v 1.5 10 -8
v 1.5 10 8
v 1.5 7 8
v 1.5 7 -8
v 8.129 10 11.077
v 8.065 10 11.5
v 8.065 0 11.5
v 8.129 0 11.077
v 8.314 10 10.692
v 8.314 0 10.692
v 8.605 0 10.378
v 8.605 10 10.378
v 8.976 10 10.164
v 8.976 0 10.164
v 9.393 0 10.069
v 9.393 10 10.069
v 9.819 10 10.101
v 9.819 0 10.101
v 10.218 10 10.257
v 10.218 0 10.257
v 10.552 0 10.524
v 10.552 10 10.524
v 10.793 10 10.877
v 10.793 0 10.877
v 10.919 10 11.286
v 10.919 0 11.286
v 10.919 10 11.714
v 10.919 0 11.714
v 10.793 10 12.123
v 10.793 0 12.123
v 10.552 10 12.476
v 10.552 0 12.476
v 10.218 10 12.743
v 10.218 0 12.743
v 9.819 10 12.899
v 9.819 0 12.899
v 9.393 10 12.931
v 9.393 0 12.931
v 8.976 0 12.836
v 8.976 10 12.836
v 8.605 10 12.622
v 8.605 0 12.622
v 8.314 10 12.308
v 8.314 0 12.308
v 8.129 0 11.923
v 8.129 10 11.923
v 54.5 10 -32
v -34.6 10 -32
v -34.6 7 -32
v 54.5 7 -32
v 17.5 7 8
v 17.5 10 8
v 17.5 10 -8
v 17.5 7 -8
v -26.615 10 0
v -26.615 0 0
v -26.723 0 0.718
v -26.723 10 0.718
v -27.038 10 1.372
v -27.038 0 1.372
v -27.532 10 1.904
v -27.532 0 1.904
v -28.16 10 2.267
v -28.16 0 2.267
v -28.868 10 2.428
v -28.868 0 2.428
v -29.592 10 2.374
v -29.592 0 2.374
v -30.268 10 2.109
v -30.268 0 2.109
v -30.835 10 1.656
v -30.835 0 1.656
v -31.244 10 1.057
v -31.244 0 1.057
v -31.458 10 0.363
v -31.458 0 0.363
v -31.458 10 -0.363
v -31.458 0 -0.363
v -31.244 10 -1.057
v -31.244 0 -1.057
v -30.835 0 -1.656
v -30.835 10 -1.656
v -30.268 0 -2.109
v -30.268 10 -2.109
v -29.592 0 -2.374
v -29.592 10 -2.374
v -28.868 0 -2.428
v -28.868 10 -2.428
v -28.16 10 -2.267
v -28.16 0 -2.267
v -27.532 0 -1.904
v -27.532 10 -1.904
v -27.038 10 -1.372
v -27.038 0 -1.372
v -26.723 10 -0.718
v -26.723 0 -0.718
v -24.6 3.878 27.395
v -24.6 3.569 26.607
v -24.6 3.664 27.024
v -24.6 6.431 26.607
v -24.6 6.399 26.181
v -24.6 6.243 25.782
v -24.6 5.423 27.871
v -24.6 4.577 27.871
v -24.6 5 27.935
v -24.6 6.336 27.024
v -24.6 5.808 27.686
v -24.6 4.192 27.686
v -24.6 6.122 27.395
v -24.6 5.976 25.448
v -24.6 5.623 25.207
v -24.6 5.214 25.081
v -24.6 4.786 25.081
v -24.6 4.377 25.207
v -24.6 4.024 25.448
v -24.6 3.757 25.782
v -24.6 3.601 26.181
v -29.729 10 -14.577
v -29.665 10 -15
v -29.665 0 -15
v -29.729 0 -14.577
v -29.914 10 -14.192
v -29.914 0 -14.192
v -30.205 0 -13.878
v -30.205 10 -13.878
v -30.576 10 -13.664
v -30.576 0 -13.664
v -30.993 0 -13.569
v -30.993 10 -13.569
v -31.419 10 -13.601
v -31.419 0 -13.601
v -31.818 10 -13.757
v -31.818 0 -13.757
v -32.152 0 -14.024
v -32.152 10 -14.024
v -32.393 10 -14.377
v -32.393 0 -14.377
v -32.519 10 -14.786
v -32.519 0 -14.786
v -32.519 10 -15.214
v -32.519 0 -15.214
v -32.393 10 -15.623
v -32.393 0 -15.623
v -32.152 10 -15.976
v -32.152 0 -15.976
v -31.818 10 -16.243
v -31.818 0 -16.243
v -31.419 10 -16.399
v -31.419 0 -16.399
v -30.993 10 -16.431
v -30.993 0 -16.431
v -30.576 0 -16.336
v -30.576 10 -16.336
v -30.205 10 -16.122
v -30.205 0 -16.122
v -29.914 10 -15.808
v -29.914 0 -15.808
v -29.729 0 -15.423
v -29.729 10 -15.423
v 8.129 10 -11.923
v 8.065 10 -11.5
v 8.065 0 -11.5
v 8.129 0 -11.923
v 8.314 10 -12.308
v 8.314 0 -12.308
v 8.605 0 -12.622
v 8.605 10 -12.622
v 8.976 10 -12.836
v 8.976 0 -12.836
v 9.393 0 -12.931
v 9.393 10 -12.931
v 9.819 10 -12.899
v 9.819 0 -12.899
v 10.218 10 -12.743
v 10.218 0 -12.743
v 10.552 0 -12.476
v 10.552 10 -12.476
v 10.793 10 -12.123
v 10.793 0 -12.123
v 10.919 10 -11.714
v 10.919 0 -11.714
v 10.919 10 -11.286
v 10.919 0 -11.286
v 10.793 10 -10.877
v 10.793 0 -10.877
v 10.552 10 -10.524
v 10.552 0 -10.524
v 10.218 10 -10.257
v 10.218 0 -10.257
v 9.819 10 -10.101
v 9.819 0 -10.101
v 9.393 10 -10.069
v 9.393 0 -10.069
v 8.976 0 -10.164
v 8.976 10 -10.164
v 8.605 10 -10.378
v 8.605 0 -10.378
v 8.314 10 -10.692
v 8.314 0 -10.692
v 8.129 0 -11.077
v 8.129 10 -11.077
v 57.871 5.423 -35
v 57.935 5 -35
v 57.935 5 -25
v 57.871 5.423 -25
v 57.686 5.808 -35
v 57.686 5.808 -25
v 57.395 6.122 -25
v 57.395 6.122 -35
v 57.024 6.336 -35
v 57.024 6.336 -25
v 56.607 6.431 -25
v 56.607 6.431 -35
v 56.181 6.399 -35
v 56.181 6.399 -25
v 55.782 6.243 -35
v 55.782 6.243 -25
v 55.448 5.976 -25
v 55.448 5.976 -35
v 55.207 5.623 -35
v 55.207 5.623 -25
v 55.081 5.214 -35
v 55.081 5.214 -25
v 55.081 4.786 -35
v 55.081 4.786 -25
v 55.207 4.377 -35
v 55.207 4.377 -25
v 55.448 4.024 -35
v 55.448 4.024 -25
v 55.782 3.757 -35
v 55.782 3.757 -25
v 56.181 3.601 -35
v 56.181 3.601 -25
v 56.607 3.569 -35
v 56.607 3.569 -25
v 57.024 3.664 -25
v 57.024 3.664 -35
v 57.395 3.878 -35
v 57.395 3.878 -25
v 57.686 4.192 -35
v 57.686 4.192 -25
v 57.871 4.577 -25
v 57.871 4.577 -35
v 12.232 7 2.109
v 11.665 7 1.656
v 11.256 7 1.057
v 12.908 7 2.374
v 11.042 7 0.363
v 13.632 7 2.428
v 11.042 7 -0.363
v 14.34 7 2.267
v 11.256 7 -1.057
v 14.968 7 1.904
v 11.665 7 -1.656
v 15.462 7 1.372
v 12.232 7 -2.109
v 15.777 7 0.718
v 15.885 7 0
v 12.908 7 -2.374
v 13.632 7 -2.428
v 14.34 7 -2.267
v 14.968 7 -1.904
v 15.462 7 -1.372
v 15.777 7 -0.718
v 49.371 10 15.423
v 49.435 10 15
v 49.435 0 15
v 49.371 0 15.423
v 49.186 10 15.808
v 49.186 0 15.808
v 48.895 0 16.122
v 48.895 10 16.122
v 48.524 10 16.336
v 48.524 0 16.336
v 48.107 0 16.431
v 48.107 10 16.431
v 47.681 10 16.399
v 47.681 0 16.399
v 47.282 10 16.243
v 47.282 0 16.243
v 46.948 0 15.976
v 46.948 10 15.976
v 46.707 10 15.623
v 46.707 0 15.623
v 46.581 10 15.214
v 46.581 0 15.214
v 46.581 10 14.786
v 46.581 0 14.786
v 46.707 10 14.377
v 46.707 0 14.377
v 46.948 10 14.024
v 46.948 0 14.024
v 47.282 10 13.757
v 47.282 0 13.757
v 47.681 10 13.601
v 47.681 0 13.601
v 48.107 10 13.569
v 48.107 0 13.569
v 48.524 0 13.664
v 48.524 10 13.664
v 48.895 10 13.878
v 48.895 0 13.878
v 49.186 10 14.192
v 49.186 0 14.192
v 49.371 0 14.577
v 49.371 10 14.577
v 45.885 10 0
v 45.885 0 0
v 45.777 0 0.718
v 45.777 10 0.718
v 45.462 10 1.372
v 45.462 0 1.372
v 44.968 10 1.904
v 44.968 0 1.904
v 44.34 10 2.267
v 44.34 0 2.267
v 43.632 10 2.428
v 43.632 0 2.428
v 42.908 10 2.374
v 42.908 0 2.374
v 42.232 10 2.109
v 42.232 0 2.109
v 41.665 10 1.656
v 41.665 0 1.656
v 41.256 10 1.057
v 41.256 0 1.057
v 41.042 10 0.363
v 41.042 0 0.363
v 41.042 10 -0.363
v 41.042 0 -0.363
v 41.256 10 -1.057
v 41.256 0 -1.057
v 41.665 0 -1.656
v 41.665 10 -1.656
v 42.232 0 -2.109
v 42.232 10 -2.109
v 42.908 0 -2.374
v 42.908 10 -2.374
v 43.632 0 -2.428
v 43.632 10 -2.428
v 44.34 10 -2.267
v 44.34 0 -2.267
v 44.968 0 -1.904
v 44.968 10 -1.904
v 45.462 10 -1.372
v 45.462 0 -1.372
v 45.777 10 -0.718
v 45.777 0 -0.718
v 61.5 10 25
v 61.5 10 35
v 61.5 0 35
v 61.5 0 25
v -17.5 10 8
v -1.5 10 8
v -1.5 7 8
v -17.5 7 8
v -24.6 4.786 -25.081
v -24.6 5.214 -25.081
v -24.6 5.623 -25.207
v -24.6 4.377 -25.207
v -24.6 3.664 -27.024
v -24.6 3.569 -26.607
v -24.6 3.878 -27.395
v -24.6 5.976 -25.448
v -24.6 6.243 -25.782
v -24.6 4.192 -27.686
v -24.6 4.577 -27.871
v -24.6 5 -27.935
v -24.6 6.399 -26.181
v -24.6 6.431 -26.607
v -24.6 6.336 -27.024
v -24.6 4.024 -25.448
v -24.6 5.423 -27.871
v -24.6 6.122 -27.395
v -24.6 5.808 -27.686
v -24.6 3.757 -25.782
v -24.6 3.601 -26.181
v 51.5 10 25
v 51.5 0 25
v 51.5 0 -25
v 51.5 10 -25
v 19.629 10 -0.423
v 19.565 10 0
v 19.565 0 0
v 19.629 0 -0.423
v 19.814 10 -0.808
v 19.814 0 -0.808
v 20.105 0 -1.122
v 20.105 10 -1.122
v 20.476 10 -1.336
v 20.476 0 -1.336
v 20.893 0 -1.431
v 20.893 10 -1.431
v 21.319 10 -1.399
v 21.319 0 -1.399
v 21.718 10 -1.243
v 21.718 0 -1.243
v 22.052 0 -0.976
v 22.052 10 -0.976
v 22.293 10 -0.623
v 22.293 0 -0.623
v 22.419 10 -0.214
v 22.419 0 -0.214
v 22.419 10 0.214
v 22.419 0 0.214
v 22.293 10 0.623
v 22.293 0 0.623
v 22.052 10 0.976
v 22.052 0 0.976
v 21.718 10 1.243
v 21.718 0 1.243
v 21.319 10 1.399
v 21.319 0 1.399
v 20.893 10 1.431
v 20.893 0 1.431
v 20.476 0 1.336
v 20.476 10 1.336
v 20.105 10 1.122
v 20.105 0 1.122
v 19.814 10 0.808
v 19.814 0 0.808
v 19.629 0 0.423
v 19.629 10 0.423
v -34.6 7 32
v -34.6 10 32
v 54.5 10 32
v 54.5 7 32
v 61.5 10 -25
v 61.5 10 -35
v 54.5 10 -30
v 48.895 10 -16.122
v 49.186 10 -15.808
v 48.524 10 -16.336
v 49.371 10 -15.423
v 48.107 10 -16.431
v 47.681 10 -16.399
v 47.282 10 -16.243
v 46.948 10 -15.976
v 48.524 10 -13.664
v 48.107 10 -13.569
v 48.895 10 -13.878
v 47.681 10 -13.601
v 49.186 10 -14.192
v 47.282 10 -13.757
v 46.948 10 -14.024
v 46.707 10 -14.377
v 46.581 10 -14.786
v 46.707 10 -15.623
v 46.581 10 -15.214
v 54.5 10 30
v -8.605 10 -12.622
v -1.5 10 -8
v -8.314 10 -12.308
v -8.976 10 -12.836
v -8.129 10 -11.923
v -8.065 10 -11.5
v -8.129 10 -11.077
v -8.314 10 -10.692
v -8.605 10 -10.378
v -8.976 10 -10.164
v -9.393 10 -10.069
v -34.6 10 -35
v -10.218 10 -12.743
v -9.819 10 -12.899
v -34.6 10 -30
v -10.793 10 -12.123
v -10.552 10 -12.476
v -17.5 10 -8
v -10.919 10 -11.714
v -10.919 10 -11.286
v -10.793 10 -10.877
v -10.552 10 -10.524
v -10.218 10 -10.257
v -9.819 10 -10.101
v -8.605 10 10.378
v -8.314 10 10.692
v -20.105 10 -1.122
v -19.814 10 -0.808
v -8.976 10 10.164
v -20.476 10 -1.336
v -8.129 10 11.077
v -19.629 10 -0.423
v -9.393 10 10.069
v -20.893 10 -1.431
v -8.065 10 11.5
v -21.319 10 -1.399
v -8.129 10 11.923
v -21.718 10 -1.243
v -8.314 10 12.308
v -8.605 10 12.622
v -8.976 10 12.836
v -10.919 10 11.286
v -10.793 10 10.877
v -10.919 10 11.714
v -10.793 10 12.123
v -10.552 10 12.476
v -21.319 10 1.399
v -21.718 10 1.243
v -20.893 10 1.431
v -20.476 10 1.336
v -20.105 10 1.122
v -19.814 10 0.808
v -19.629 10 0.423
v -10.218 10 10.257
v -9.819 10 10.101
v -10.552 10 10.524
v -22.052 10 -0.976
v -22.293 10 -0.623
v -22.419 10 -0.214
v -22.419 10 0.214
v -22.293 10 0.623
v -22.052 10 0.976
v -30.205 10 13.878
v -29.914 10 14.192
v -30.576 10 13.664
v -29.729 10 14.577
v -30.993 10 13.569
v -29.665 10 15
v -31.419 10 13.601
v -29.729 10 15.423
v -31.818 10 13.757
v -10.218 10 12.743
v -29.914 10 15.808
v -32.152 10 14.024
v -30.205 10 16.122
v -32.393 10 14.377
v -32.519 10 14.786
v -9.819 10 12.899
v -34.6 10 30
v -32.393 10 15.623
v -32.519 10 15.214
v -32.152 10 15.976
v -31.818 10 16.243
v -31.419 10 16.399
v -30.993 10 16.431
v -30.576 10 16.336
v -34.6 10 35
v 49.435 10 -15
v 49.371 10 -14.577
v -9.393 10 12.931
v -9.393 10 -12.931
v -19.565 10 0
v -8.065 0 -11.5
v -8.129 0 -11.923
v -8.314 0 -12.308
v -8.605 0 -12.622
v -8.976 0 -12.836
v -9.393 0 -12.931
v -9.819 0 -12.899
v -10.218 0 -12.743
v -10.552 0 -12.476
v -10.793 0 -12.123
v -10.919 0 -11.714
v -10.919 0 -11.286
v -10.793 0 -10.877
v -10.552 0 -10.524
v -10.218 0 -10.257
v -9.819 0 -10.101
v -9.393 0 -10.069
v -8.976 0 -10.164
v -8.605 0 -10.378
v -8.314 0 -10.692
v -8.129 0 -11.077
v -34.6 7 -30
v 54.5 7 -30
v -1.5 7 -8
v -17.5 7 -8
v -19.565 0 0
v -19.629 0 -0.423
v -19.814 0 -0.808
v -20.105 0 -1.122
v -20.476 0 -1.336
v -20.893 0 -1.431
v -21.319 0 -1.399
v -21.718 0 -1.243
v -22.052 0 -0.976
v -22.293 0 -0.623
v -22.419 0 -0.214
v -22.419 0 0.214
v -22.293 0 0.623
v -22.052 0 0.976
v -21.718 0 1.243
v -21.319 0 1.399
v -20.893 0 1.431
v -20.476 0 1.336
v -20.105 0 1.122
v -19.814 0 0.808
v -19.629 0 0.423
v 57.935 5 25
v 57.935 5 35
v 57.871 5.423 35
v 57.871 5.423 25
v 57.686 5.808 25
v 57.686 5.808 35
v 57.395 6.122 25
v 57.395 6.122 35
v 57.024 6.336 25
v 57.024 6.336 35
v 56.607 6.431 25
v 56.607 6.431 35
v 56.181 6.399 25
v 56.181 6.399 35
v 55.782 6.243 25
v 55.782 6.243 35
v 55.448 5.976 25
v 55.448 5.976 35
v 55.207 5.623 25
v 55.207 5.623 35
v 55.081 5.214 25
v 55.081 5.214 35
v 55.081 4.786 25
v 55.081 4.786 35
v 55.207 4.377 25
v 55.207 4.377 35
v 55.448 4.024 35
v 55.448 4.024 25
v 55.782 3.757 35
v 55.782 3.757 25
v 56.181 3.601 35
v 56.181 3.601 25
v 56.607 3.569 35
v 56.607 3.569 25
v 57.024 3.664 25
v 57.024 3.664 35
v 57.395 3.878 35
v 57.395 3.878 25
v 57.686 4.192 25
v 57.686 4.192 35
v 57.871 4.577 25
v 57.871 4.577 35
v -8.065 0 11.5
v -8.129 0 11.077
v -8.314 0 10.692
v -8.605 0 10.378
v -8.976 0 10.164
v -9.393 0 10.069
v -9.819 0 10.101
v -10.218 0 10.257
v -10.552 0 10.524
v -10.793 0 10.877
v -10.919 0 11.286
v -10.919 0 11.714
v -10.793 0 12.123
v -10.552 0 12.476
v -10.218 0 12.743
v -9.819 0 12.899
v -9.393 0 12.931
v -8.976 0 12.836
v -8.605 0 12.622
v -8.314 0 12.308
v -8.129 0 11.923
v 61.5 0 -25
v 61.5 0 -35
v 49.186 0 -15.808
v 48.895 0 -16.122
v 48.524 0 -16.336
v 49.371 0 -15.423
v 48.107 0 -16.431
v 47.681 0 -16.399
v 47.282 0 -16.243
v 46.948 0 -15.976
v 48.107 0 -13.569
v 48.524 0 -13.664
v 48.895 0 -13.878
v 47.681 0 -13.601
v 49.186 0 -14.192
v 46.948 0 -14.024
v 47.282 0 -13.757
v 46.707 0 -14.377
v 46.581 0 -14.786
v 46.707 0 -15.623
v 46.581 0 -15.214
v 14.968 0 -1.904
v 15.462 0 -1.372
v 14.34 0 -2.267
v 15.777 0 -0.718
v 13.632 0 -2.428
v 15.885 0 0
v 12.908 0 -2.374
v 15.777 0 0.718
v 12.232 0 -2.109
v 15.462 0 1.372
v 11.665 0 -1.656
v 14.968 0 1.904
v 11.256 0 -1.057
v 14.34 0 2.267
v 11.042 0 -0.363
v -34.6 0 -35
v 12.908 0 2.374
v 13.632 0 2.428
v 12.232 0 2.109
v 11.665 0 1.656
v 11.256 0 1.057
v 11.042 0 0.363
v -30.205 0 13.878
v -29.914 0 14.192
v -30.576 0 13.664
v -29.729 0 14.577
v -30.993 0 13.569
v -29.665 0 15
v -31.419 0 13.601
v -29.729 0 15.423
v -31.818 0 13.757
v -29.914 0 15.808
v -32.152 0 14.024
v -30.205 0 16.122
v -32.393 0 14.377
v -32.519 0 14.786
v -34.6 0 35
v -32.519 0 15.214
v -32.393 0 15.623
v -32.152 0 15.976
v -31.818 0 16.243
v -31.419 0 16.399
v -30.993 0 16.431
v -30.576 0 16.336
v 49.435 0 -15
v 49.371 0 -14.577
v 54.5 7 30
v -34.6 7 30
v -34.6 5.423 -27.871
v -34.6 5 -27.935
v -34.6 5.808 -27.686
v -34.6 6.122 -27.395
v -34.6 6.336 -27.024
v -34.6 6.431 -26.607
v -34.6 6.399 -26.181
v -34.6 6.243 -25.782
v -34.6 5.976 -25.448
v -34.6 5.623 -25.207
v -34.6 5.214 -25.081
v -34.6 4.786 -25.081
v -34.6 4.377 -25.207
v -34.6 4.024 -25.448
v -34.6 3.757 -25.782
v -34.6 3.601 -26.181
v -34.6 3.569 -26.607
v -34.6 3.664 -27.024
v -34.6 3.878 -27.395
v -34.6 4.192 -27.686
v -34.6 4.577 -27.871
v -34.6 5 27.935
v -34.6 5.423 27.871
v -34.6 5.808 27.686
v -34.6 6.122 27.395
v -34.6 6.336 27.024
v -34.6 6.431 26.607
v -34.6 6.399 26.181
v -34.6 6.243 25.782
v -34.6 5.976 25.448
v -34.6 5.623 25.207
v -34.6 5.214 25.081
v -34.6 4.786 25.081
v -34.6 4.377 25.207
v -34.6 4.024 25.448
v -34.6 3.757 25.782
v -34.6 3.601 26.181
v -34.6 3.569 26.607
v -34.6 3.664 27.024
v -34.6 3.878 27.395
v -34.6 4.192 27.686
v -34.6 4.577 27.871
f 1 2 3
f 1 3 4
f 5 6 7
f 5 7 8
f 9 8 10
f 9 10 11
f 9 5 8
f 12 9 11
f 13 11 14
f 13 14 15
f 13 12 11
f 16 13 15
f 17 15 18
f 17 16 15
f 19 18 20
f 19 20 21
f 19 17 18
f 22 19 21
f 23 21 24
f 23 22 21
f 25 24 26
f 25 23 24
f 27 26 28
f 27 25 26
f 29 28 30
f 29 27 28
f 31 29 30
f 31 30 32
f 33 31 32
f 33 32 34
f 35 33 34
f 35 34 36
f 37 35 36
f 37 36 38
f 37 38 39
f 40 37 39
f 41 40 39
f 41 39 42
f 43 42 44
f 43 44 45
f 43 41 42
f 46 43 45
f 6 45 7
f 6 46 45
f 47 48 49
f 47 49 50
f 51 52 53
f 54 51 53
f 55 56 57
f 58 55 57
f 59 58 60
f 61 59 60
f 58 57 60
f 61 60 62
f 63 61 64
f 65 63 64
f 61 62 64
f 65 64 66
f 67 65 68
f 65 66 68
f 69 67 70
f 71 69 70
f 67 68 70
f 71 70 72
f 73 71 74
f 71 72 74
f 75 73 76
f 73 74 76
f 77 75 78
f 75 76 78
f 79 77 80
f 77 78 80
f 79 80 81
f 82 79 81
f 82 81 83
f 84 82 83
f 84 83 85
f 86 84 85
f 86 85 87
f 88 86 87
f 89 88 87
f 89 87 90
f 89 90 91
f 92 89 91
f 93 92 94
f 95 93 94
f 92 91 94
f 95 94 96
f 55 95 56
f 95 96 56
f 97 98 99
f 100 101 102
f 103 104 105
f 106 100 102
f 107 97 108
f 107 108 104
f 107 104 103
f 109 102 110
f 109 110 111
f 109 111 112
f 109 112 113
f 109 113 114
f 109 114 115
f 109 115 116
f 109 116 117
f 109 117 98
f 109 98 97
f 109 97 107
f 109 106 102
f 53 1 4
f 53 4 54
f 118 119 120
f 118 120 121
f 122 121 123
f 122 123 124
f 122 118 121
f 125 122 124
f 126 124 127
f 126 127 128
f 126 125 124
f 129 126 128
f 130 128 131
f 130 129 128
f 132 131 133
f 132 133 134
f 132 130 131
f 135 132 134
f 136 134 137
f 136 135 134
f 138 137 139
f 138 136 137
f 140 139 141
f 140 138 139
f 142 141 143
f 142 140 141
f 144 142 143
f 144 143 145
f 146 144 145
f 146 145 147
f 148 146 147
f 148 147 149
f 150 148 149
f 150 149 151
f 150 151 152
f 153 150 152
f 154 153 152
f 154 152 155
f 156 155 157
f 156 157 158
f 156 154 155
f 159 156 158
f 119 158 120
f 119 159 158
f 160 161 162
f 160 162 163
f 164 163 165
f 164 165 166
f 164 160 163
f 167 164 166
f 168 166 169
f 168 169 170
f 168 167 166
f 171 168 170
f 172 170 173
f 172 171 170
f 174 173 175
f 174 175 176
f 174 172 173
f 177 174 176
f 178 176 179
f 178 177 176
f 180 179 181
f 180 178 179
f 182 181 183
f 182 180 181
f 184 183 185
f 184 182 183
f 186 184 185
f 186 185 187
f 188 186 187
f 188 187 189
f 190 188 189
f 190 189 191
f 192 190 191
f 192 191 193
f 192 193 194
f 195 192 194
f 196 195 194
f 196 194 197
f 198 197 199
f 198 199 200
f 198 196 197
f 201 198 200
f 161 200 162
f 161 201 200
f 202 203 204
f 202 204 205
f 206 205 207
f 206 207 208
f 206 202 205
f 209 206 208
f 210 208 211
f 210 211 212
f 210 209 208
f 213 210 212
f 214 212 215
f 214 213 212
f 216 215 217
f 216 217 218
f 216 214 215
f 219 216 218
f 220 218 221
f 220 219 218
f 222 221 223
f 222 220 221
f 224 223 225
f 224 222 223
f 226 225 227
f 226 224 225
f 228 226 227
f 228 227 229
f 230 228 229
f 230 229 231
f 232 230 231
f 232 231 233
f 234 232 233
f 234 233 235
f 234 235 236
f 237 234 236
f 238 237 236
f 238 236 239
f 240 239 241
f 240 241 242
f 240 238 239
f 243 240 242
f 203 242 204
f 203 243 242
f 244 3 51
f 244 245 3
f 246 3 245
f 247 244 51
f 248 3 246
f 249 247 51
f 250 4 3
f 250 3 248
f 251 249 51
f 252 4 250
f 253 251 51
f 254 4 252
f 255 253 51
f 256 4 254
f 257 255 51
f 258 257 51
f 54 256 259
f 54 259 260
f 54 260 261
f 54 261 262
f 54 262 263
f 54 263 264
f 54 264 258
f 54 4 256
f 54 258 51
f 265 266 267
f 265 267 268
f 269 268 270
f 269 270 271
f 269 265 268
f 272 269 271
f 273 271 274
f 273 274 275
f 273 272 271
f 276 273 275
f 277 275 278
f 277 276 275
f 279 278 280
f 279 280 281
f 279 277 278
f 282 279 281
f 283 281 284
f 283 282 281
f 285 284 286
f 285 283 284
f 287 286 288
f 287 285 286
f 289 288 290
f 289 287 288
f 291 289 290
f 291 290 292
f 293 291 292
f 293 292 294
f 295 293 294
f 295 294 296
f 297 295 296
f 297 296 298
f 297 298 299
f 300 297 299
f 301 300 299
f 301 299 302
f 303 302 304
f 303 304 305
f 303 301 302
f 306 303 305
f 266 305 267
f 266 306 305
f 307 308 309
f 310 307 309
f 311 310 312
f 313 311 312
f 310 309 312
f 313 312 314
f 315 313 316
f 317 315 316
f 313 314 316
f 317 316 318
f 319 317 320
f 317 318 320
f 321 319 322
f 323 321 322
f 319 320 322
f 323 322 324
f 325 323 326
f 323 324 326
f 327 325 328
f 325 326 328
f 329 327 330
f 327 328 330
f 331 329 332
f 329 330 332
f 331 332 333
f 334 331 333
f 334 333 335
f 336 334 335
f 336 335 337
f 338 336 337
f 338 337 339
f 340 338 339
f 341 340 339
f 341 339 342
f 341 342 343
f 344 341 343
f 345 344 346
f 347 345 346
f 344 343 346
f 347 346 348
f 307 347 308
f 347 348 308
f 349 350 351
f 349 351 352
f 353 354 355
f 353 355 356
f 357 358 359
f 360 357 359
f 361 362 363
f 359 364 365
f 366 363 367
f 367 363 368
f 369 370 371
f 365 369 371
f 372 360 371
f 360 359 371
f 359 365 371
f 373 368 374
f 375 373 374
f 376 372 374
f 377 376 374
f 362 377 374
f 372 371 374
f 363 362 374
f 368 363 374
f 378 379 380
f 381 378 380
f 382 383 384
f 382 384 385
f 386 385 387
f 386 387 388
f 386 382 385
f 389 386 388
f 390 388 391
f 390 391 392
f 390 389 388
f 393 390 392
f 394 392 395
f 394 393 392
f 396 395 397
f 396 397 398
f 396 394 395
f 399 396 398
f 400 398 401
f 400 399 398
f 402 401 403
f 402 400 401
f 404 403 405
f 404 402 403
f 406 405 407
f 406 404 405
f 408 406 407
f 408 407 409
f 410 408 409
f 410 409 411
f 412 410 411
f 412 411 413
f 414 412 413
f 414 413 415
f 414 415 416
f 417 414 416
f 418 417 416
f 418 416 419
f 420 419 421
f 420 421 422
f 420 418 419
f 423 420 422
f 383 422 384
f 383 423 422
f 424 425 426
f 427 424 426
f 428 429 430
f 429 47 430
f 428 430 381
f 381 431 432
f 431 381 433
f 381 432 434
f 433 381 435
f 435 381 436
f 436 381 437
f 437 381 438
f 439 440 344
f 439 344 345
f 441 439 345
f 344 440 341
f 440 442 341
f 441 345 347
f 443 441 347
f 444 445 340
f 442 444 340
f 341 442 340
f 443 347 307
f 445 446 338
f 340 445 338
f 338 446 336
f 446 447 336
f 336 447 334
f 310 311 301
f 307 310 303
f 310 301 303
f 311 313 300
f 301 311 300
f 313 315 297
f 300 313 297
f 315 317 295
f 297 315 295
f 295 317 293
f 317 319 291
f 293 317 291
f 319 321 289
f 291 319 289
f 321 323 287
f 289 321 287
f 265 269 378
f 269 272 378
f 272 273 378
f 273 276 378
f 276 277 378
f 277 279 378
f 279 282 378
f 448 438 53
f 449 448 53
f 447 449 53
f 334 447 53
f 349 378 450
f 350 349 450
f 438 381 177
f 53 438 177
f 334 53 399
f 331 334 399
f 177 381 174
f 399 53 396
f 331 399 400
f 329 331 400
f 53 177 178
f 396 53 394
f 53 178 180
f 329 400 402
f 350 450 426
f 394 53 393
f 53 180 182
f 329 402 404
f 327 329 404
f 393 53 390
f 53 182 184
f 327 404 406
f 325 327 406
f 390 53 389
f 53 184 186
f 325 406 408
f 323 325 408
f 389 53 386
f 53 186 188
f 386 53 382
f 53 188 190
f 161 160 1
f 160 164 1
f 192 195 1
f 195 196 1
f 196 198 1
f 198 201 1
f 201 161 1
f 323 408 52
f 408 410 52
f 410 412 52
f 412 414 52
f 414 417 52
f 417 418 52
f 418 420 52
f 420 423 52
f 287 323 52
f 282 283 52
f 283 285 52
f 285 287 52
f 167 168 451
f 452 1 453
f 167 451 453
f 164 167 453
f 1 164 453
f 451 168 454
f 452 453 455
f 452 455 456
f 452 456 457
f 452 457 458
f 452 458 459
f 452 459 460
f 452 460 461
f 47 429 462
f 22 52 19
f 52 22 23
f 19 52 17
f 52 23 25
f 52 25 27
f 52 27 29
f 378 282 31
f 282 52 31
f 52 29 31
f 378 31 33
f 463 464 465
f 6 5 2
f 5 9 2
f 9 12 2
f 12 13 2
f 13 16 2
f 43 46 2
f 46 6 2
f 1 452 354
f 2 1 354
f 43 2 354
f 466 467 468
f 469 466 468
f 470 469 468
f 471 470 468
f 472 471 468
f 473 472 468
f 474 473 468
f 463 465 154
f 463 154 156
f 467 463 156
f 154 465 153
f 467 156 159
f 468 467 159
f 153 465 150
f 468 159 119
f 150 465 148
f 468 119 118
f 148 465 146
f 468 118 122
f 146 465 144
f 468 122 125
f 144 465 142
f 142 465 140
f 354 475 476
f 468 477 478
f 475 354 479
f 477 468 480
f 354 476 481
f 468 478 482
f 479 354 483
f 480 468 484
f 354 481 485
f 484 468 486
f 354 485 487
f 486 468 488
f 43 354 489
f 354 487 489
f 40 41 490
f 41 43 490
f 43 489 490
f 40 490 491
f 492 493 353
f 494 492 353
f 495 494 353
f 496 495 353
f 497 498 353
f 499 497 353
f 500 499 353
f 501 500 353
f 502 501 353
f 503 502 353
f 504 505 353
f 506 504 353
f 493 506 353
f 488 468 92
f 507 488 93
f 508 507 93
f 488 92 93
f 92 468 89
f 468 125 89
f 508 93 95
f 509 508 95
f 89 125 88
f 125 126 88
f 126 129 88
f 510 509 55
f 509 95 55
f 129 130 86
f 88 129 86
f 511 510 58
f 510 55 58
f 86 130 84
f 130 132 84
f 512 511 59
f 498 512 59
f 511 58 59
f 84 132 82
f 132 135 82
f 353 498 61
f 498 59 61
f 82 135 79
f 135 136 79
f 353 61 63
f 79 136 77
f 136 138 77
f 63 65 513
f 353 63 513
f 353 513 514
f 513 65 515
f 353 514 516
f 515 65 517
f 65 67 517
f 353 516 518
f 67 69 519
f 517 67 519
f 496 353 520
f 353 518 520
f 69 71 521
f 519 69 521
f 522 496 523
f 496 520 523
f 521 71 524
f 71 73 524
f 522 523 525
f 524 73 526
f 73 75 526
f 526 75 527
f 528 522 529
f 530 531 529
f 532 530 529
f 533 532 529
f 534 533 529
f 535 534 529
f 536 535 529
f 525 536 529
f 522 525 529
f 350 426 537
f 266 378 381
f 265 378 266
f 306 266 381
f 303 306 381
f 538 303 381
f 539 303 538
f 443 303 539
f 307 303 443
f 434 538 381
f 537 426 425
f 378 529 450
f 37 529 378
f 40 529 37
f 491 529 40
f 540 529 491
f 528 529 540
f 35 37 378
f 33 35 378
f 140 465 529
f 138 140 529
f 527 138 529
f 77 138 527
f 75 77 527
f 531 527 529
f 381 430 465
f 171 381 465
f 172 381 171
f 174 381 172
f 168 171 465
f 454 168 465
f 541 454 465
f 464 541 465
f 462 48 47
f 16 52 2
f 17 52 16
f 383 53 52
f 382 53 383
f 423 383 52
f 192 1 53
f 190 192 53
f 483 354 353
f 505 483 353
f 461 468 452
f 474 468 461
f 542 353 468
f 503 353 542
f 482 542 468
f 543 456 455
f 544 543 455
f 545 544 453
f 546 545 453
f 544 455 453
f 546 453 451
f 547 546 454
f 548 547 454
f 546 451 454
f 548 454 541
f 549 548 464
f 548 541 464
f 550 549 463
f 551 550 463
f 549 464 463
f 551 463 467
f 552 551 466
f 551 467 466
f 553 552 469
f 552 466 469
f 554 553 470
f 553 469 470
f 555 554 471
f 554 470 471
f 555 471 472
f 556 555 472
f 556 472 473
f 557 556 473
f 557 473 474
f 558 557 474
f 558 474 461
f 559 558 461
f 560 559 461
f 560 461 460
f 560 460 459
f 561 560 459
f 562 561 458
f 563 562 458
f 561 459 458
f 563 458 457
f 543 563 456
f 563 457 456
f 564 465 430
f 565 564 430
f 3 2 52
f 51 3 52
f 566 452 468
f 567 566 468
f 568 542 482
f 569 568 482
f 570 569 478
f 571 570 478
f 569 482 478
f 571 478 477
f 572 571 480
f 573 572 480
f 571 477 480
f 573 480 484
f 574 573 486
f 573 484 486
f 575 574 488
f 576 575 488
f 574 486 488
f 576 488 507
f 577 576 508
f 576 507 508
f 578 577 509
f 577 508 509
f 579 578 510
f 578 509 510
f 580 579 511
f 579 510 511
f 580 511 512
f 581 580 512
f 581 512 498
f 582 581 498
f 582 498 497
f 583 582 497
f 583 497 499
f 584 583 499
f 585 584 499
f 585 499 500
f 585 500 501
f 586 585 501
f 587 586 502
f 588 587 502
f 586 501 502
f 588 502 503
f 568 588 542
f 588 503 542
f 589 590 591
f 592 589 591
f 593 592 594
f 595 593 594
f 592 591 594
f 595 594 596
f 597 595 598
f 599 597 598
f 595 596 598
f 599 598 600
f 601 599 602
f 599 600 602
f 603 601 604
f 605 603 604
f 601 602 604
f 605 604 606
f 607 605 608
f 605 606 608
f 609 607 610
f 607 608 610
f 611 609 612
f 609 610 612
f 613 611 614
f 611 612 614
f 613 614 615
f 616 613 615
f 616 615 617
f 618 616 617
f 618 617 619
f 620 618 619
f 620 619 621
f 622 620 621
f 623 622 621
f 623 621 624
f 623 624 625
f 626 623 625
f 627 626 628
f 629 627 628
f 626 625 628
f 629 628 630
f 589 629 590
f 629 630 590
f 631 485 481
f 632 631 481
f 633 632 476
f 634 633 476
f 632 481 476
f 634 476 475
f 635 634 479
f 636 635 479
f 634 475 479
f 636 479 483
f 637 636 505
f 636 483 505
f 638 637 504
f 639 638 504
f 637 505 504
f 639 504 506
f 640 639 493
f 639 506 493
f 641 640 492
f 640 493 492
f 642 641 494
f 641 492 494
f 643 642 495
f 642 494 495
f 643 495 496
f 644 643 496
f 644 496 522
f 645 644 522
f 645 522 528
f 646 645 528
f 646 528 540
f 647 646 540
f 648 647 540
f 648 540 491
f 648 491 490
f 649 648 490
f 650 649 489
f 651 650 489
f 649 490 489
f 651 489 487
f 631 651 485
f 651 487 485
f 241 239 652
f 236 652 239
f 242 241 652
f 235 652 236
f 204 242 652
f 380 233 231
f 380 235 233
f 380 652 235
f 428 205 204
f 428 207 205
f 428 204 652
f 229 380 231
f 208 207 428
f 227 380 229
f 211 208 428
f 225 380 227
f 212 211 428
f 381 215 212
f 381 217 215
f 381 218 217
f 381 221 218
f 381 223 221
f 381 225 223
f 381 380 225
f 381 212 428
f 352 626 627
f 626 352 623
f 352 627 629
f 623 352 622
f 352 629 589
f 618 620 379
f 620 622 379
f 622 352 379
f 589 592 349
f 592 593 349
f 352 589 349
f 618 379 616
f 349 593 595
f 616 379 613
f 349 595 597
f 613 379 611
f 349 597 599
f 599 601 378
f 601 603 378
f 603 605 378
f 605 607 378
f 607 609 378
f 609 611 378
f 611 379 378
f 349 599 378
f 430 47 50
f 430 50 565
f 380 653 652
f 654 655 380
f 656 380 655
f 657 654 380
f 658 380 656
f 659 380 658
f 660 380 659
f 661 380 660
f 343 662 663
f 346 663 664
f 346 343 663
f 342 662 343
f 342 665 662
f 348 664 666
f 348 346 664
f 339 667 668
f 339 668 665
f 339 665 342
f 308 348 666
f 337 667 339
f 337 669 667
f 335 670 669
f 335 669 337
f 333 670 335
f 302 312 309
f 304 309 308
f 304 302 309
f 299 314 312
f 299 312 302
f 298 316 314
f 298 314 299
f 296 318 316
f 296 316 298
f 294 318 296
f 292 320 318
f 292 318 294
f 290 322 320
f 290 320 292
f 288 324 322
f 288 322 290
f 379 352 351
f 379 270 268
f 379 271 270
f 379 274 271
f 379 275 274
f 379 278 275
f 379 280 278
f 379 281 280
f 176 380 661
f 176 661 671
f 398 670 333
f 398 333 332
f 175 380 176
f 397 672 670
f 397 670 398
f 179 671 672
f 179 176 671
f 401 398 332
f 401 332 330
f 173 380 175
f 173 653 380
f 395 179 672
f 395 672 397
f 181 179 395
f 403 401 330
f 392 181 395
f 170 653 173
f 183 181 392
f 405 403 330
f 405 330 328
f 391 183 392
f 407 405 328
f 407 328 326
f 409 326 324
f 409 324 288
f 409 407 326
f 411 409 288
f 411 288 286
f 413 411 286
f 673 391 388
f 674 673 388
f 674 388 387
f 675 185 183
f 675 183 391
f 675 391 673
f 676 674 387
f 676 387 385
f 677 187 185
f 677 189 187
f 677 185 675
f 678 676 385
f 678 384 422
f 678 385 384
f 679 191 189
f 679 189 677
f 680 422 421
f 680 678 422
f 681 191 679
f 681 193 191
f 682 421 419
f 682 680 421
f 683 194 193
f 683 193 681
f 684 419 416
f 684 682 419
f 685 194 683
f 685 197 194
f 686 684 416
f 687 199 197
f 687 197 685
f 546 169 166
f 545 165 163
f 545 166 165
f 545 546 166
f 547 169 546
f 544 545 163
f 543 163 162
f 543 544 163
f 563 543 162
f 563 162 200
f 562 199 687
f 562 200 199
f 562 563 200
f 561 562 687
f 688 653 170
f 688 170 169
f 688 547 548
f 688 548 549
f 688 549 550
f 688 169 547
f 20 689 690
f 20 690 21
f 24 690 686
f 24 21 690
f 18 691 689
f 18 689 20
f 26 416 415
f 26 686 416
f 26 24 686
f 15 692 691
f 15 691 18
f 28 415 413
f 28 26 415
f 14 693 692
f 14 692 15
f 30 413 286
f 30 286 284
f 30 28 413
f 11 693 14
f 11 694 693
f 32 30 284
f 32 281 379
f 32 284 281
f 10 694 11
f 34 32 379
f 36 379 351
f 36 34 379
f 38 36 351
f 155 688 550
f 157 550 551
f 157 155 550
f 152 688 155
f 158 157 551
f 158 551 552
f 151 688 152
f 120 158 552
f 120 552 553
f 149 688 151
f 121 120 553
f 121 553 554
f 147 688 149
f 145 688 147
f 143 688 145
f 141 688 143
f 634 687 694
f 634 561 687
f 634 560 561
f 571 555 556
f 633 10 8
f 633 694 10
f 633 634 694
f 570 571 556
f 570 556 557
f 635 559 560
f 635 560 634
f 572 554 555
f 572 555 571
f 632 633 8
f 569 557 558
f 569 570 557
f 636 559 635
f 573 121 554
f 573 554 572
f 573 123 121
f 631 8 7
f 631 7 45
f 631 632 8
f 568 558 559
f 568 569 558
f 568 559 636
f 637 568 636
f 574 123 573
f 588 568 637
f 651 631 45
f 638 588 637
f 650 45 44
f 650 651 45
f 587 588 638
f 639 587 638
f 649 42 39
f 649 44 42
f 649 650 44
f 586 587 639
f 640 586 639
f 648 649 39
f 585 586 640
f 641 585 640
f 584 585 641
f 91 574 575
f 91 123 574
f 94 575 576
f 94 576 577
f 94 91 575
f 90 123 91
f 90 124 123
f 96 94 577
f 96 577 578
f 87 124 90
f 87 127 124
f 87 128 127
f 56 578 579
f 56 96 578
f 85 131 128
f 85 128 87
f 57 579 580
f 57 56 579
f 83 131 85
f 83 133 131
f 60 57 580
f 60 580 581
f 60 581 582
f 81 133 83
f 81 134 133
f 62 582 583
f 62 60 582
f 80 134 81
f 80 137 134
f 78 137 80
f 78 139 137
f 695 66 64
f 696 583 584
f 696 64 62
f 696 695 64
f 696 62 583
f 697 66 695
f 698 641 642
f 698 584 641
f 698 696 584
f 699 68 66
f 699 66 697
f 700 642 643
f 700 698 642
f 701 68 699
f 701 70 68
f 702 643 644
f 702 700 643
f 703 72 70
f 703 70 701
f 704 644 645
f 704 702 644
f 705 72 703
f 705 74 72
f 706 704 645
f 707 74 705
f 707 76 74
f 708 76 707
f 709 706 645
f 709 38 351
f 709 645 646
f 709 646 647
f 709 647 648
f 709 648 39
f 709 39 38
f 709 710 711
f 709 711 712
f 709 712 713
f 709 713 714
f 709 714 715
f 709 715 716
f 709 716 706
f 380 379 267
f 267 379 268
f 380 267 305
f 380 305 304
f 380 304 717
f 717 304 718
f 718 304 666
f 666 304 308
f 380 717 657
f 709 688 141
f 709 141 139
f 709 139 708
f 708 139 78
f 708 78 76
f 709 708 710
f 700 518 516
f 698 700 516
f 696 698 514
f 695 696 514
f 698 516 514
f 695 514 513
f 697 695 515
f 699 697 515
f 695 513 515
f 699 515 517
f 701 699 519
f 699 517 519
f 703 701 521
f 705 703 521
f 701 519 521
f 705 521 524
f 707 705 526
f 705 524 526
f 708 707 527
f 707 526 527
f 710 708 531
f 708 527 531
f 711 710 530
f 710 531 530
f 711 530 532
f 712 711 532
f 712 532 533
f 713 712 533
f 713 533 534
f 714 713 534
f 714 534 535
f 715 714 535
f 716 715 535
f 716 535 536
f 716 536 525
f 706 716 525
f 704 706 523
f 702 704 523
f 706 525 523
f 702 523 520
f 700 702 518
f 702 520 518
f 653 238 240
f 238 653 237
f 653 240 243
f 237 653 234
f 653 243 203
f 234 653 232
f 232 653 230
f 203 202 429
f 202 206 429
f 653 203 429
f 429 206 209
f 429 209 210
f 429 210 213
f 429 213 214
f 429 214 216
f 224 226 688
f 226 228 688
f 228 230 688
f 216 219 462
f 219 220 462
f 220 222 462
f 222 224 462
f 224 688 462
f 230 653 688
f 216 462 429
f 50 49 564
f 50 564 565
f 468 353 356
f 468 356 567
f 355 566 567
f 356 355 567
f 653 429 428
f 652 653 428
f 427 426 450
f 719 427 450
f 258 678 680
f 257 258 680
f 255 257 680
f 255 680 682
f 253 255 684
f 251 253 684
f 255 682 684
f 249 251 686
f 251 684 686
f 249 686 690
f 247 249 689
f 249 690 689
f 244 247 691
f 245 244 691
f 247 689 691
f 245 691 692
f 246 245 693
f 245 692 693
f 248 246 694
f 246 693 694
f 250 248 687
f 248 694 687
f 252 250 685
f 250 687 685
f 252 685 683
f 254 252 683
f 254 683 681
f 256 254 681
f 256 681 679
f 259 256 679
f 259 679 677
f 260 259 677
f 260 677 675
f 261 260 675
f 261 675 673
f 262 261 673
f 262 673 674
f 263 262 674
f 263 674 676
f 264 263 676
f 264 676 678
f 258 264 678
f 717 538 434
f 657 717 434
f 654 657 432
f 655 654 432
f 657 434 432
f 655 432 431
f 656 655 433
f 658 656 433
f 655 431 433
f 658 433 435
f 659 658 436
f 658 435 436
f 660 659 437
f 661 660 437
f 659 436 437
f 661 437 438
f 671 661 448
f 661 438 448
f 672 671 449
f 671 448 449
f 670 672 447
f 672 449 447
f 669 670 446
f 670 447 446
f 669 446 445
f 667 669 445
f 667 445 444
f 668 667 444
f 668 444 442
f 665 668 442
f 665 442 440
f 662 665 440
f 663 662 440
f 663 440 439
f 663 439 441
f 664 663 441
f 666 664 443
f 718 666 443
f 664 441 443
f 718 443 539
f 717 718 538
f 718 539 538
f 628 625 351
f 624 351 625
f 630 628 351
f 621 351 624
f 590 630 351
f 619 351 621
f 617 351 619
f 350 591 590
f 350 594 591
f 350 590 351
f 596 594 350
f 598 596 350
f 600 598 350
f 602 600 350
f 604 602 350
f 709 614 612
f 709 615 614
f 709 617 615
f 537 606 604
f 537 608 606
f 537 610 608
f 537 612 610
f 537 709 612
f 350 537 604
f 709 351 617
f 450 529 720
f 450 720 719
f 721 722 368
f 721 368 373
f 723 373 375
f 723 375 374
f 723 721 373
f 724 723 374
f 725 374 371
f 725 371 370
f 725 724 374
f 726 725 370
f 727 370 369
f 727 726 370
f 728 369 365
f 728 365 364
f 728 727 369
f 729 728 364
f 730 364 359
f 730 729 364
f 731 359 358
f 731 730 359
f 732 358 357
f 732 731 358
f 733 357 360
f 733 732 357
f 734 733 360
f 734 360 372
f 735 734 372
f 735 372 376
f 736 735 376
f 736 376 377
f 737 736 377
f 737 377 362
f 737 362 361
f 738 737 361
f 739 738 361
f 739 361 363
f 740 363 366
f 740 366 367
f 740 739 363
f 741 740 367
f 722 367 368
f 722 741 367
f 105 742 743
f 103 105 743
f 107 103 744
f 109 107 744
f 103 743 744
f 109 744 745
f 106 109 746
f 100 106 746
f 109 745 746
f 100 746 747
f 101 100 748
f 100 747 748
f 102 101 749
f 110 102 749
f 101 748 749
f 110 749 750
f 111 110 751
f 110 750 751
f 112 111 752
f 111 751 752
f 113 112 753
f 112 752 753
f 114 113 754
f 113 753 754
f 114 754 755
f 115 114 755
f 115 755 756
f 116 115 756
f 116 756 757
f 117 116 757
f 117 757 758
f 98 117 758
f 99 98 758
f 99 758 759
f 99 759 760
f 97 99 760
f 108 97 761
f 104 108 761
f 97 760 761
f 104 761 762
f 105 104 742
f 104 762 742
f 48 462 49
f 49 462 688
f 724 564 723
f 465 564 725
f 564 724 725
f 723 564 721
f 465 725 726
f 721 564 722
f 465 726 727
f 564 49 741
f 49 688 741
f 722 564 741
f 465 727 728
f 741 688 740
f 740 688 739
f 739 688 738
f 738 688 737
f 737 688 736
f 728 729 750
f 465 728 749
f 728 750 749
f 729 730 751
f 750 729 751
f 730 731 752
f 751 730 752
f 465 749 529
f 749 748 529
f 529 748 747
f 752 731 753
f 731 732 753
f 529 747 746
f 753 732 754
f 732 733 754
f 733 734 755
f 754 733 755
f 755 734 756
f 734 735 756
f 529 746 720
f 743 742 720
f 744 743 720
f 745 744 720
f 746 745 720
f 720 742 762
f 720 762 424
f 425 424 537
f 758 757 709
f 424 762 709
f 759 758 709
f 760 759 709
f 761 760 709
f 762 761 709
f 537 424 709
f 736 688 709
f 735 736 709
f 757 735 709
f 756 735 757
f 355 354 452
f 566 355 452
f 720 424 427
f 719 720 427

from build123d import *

# Parameters (mm, degrees)
SALIENTE_EXTRUIR1_DEPTH = 10
CROQUIS7_W              = 86.1
CROQUIS7_H              = 2
CORTAR_EXTRUIR4_DEPTH   = 3
CROQUIS15_R             = 1.435
CORTAR_EXTRUIR10_DEPTH  = 10
CROQUIS16_W             = 10
CROQUIS16_H             = 10
SALIENTE_EXTRUIR7_DEPTH = 10
CROQUIS17_W             = 3
CROQUIS17_H             = 2
CORTAR_EXTRUIR11_DEPTH  = 3
CROQUIS18_R             = 1.435
CORTAR_EXTRUIR12_DEPTH  = 10
CROQUIS19_R             = 1.435
CORTAR_EXTRUIR13_DEPTH  = 10
CROQUIS20_R             = 1.435
CORTAR_EXTRUIR14_DEPTH  = 10
CROQUIS21_R             = 2.435
CORTAR_EXTRUIR15_DEPTH  = 10
CROQUIS2_W              = 16
CROQUIS2_H              = 16
CORTAR_EXTRUIR16_DEPTH  = 3
CROQUIS22_R             = 1.435
CORTAR_EXTRUIR17_DEPTH  = 10


with BuildPart() as part:
    # Croquis1 → Saliente-Extruir1 (new body)
    with BuildSketch(Plane(origin=(0, 0, 0), x_dir=(1, 0, 0), z_dir=(0, 1, 0))):
        Polygon((22.5, -35), (51.5, -35), (51.5, 35), (22.5, 35), (-22.5, 35), (-34.6, 35), (-34.6, -35), (-22.5, -35), align=None)
    extrude(amount=SALIENTE_EXTRUIR1_DEPTH)

    # Croquis7 → Cortar-Extruir4 (cut)
    with BuildSketch(Plane(origin=(0, 10, 0), x_dir=(1, 0, 0), z_dir=(0, 1, 0))):
        with Locations((8.45, 31)):
            Rectangle(CROQUIS7_W, CROQUIS7_H)
    cortar_extruir4 = extrude(amount=-CORTAR_EXTRUIR4_DEPTH, mode=Mode.SUBTRACT)

    # Simetría2: Cortar-Extruir4 across plane
    add(cortar_extruir4.mirror(Plane.XY), mode=Mode.SUBTRACT)

    # Croquis15 → Cortar-Extruir10 (cut)
    with BuildSketch(Plane(origin=(0, 10, 0), x_dir=(1, 0, 0), z_dir=(0, 1, 0))):
        with Locations((-31.1, -15)):
            Circle(CROQUIS15_R)
    cortar_extruir10 = extrude(amount=-CORTAR_EXTRUIR10_DEPTH, mode=Mode.SUBTRACT)

    # Simetría4: Cortar-Extruir10 across plane
    add(cortar_extruir10.mirror(Plane.XY), mode=Mode.SUBTRACT)

    # Croquis16 → Saliente-Extruir7 (add)
    with BuildSketch(Plane(origin=(51.5, 0, 0), x_dir=(0, 0, -1), z_dir=(1, 0, 0))):
        with Locations((-30, 5)):
            Rectangle(CROQUIS16_W, CROQUIS16_H)
    saliente_extruir7 = extrude(amount=SALIENTE_EXTRUIR7_DEPTH)

    # Croquis17 → Cortar-Extruir11 (cut)
    with BuildSketch(Plane(origin=(0, 10, 0), x_dir=(1, 0, 0), z_dir=(0, 1, 0))):
        with Locations((53, -31)):
            Rectangle(CROQUIS17_W, CROQUIS17_H)
    cortar_extruir11 = extrude(amount=-CORTAR_EXTRUIR11_DEPTH, mode=Mode.SUBTRACT)

    # Simetría5: Saliente-Extruir7, Cortar-Extruir11 across plane
    add(saliente_extruir7.mirror(Plane.XY))
    add(cortar_extruir11.mirror(Plane.XY), mode=Mode.SUBTRACT)

    # Croquis18 → Cortar-Extruir12 (cut)
    with BuildSketch(Plane(origin=(0, 10, 0), x_dir=(1, 0, 0), z_dir=(0, 1, 0))):
        with Locations((48, 15)):
            Circle(CROQUIS18_R)
    cortar_extruir12 = extrude(amount=-CORTAR_EXTRUIR12_DEPTH, mode=Mode.SUBTRACT)

    # Simetría6: Cortar-Extruir12 across plane
    add(cortar_extruir12.mirror(Plane.XY), mode=Mode.SUBTRACT)

    # Croquis19 → Cortar-Extruir13 (cut)
    with BuildSketch(Plane.ZY.offset(34.6)):
        with Locations((26.5, 5)):
            Circle(CROQUIS19_R)
    cortar_extruir13 = extrude(amount=-CORTAR_EXTRUIR13_DEPTH, mode=Mode.SUBTRACT)

    # Simetría7: Cortar-Extruir13 across plane
    add(cortar_extruir13.mirror(Plane.XY), mode=Mode.SUBTRACT)

    # Croquis20 → Cortar-Extruir14 (cut)
    with BuildSketch(Plane.XY.offset(35)):
        with Locations((56.5, 5)):
            Circle(CROQUIS20_R)
    cortar_extruir14 = extrude(amount=-CORTAR_EXTRUIR14_DEPTH, mode=Mode.SUBTRACT)

    # Simetría8: Cortar-Extruir14 across plane
    add(cortar_extruir14.mirror(Plane.XY), mode=Mode.SUBTRACT)

    # Croquis21 → Cortar-Extruir15 (cut)
    with BuildSketch(Plane.XZ):
        with Locations((13.45, 0)):
            Circle(CROQUIS21_R)
        with Locations((43.45, 0)):
            Circle(CROQUIS21_R)
        with Locations((-29.05, 0)):
            Circle(CROQUIS21_R)
    extrude(amount=-CORTAR_EXTRUIR15_DEPTH, mode=Mode.SUBTRACT)

    # Croquis2 → Cortar-Extruir16 (cut)
    with BuildSketch(Plane(origin=(0, 10, 0), x_dir=(1, 0, 0), z_dir=(0, 1, 0))):
        with Locations((9.5, 0)):
            Rectangle(CROQUIS2_W, CROQUIS2_H)
    cortar_extruir16 = extrude(amount=-CORTAR_EXTRUIR16_DEPTH, mode=Mode.SUBTRACT)

    # Simetría9: Cortar-Extruir16 across plane
    add(cortar_extruir16.mirror(Plane(origin=(0, 0, 0), x_dir=(0, 0, 1), z_dir=(1, 0, 0))), mode=Mode.SUBTRACT)

    # Croquis22 → Cortar-Extruir17 (cut)
    with BuildSketch(Plane(origin=(0, 10, 0), x_dir=(1, 0, 0), z_dir=(0, 1, 0))):
        with Locations((-9.5, 11.5)):
            Circle(CROQUIS22_R)
        with Locations((-21, 0)):
            Circle(CROQUIS22_R)
        with Locations((-9.5, -11.5)):
            Circle(CROQUIS22_R)
    cortar_extruir17 = extrude(amount=-CORTAR_EXTRUIR17_DEPTH, mode=Mode.SUBTRACT)

    # Simetría10: Cortar-Extruir17 across plane
    add(cortar_extruir17.mirror(Plane(origin=(0, 0, 0), x_dir=(0, 0, 1), z_dir=(1, 0, 0))), mode=Mode.SUBTRACT)


solid = part.part
